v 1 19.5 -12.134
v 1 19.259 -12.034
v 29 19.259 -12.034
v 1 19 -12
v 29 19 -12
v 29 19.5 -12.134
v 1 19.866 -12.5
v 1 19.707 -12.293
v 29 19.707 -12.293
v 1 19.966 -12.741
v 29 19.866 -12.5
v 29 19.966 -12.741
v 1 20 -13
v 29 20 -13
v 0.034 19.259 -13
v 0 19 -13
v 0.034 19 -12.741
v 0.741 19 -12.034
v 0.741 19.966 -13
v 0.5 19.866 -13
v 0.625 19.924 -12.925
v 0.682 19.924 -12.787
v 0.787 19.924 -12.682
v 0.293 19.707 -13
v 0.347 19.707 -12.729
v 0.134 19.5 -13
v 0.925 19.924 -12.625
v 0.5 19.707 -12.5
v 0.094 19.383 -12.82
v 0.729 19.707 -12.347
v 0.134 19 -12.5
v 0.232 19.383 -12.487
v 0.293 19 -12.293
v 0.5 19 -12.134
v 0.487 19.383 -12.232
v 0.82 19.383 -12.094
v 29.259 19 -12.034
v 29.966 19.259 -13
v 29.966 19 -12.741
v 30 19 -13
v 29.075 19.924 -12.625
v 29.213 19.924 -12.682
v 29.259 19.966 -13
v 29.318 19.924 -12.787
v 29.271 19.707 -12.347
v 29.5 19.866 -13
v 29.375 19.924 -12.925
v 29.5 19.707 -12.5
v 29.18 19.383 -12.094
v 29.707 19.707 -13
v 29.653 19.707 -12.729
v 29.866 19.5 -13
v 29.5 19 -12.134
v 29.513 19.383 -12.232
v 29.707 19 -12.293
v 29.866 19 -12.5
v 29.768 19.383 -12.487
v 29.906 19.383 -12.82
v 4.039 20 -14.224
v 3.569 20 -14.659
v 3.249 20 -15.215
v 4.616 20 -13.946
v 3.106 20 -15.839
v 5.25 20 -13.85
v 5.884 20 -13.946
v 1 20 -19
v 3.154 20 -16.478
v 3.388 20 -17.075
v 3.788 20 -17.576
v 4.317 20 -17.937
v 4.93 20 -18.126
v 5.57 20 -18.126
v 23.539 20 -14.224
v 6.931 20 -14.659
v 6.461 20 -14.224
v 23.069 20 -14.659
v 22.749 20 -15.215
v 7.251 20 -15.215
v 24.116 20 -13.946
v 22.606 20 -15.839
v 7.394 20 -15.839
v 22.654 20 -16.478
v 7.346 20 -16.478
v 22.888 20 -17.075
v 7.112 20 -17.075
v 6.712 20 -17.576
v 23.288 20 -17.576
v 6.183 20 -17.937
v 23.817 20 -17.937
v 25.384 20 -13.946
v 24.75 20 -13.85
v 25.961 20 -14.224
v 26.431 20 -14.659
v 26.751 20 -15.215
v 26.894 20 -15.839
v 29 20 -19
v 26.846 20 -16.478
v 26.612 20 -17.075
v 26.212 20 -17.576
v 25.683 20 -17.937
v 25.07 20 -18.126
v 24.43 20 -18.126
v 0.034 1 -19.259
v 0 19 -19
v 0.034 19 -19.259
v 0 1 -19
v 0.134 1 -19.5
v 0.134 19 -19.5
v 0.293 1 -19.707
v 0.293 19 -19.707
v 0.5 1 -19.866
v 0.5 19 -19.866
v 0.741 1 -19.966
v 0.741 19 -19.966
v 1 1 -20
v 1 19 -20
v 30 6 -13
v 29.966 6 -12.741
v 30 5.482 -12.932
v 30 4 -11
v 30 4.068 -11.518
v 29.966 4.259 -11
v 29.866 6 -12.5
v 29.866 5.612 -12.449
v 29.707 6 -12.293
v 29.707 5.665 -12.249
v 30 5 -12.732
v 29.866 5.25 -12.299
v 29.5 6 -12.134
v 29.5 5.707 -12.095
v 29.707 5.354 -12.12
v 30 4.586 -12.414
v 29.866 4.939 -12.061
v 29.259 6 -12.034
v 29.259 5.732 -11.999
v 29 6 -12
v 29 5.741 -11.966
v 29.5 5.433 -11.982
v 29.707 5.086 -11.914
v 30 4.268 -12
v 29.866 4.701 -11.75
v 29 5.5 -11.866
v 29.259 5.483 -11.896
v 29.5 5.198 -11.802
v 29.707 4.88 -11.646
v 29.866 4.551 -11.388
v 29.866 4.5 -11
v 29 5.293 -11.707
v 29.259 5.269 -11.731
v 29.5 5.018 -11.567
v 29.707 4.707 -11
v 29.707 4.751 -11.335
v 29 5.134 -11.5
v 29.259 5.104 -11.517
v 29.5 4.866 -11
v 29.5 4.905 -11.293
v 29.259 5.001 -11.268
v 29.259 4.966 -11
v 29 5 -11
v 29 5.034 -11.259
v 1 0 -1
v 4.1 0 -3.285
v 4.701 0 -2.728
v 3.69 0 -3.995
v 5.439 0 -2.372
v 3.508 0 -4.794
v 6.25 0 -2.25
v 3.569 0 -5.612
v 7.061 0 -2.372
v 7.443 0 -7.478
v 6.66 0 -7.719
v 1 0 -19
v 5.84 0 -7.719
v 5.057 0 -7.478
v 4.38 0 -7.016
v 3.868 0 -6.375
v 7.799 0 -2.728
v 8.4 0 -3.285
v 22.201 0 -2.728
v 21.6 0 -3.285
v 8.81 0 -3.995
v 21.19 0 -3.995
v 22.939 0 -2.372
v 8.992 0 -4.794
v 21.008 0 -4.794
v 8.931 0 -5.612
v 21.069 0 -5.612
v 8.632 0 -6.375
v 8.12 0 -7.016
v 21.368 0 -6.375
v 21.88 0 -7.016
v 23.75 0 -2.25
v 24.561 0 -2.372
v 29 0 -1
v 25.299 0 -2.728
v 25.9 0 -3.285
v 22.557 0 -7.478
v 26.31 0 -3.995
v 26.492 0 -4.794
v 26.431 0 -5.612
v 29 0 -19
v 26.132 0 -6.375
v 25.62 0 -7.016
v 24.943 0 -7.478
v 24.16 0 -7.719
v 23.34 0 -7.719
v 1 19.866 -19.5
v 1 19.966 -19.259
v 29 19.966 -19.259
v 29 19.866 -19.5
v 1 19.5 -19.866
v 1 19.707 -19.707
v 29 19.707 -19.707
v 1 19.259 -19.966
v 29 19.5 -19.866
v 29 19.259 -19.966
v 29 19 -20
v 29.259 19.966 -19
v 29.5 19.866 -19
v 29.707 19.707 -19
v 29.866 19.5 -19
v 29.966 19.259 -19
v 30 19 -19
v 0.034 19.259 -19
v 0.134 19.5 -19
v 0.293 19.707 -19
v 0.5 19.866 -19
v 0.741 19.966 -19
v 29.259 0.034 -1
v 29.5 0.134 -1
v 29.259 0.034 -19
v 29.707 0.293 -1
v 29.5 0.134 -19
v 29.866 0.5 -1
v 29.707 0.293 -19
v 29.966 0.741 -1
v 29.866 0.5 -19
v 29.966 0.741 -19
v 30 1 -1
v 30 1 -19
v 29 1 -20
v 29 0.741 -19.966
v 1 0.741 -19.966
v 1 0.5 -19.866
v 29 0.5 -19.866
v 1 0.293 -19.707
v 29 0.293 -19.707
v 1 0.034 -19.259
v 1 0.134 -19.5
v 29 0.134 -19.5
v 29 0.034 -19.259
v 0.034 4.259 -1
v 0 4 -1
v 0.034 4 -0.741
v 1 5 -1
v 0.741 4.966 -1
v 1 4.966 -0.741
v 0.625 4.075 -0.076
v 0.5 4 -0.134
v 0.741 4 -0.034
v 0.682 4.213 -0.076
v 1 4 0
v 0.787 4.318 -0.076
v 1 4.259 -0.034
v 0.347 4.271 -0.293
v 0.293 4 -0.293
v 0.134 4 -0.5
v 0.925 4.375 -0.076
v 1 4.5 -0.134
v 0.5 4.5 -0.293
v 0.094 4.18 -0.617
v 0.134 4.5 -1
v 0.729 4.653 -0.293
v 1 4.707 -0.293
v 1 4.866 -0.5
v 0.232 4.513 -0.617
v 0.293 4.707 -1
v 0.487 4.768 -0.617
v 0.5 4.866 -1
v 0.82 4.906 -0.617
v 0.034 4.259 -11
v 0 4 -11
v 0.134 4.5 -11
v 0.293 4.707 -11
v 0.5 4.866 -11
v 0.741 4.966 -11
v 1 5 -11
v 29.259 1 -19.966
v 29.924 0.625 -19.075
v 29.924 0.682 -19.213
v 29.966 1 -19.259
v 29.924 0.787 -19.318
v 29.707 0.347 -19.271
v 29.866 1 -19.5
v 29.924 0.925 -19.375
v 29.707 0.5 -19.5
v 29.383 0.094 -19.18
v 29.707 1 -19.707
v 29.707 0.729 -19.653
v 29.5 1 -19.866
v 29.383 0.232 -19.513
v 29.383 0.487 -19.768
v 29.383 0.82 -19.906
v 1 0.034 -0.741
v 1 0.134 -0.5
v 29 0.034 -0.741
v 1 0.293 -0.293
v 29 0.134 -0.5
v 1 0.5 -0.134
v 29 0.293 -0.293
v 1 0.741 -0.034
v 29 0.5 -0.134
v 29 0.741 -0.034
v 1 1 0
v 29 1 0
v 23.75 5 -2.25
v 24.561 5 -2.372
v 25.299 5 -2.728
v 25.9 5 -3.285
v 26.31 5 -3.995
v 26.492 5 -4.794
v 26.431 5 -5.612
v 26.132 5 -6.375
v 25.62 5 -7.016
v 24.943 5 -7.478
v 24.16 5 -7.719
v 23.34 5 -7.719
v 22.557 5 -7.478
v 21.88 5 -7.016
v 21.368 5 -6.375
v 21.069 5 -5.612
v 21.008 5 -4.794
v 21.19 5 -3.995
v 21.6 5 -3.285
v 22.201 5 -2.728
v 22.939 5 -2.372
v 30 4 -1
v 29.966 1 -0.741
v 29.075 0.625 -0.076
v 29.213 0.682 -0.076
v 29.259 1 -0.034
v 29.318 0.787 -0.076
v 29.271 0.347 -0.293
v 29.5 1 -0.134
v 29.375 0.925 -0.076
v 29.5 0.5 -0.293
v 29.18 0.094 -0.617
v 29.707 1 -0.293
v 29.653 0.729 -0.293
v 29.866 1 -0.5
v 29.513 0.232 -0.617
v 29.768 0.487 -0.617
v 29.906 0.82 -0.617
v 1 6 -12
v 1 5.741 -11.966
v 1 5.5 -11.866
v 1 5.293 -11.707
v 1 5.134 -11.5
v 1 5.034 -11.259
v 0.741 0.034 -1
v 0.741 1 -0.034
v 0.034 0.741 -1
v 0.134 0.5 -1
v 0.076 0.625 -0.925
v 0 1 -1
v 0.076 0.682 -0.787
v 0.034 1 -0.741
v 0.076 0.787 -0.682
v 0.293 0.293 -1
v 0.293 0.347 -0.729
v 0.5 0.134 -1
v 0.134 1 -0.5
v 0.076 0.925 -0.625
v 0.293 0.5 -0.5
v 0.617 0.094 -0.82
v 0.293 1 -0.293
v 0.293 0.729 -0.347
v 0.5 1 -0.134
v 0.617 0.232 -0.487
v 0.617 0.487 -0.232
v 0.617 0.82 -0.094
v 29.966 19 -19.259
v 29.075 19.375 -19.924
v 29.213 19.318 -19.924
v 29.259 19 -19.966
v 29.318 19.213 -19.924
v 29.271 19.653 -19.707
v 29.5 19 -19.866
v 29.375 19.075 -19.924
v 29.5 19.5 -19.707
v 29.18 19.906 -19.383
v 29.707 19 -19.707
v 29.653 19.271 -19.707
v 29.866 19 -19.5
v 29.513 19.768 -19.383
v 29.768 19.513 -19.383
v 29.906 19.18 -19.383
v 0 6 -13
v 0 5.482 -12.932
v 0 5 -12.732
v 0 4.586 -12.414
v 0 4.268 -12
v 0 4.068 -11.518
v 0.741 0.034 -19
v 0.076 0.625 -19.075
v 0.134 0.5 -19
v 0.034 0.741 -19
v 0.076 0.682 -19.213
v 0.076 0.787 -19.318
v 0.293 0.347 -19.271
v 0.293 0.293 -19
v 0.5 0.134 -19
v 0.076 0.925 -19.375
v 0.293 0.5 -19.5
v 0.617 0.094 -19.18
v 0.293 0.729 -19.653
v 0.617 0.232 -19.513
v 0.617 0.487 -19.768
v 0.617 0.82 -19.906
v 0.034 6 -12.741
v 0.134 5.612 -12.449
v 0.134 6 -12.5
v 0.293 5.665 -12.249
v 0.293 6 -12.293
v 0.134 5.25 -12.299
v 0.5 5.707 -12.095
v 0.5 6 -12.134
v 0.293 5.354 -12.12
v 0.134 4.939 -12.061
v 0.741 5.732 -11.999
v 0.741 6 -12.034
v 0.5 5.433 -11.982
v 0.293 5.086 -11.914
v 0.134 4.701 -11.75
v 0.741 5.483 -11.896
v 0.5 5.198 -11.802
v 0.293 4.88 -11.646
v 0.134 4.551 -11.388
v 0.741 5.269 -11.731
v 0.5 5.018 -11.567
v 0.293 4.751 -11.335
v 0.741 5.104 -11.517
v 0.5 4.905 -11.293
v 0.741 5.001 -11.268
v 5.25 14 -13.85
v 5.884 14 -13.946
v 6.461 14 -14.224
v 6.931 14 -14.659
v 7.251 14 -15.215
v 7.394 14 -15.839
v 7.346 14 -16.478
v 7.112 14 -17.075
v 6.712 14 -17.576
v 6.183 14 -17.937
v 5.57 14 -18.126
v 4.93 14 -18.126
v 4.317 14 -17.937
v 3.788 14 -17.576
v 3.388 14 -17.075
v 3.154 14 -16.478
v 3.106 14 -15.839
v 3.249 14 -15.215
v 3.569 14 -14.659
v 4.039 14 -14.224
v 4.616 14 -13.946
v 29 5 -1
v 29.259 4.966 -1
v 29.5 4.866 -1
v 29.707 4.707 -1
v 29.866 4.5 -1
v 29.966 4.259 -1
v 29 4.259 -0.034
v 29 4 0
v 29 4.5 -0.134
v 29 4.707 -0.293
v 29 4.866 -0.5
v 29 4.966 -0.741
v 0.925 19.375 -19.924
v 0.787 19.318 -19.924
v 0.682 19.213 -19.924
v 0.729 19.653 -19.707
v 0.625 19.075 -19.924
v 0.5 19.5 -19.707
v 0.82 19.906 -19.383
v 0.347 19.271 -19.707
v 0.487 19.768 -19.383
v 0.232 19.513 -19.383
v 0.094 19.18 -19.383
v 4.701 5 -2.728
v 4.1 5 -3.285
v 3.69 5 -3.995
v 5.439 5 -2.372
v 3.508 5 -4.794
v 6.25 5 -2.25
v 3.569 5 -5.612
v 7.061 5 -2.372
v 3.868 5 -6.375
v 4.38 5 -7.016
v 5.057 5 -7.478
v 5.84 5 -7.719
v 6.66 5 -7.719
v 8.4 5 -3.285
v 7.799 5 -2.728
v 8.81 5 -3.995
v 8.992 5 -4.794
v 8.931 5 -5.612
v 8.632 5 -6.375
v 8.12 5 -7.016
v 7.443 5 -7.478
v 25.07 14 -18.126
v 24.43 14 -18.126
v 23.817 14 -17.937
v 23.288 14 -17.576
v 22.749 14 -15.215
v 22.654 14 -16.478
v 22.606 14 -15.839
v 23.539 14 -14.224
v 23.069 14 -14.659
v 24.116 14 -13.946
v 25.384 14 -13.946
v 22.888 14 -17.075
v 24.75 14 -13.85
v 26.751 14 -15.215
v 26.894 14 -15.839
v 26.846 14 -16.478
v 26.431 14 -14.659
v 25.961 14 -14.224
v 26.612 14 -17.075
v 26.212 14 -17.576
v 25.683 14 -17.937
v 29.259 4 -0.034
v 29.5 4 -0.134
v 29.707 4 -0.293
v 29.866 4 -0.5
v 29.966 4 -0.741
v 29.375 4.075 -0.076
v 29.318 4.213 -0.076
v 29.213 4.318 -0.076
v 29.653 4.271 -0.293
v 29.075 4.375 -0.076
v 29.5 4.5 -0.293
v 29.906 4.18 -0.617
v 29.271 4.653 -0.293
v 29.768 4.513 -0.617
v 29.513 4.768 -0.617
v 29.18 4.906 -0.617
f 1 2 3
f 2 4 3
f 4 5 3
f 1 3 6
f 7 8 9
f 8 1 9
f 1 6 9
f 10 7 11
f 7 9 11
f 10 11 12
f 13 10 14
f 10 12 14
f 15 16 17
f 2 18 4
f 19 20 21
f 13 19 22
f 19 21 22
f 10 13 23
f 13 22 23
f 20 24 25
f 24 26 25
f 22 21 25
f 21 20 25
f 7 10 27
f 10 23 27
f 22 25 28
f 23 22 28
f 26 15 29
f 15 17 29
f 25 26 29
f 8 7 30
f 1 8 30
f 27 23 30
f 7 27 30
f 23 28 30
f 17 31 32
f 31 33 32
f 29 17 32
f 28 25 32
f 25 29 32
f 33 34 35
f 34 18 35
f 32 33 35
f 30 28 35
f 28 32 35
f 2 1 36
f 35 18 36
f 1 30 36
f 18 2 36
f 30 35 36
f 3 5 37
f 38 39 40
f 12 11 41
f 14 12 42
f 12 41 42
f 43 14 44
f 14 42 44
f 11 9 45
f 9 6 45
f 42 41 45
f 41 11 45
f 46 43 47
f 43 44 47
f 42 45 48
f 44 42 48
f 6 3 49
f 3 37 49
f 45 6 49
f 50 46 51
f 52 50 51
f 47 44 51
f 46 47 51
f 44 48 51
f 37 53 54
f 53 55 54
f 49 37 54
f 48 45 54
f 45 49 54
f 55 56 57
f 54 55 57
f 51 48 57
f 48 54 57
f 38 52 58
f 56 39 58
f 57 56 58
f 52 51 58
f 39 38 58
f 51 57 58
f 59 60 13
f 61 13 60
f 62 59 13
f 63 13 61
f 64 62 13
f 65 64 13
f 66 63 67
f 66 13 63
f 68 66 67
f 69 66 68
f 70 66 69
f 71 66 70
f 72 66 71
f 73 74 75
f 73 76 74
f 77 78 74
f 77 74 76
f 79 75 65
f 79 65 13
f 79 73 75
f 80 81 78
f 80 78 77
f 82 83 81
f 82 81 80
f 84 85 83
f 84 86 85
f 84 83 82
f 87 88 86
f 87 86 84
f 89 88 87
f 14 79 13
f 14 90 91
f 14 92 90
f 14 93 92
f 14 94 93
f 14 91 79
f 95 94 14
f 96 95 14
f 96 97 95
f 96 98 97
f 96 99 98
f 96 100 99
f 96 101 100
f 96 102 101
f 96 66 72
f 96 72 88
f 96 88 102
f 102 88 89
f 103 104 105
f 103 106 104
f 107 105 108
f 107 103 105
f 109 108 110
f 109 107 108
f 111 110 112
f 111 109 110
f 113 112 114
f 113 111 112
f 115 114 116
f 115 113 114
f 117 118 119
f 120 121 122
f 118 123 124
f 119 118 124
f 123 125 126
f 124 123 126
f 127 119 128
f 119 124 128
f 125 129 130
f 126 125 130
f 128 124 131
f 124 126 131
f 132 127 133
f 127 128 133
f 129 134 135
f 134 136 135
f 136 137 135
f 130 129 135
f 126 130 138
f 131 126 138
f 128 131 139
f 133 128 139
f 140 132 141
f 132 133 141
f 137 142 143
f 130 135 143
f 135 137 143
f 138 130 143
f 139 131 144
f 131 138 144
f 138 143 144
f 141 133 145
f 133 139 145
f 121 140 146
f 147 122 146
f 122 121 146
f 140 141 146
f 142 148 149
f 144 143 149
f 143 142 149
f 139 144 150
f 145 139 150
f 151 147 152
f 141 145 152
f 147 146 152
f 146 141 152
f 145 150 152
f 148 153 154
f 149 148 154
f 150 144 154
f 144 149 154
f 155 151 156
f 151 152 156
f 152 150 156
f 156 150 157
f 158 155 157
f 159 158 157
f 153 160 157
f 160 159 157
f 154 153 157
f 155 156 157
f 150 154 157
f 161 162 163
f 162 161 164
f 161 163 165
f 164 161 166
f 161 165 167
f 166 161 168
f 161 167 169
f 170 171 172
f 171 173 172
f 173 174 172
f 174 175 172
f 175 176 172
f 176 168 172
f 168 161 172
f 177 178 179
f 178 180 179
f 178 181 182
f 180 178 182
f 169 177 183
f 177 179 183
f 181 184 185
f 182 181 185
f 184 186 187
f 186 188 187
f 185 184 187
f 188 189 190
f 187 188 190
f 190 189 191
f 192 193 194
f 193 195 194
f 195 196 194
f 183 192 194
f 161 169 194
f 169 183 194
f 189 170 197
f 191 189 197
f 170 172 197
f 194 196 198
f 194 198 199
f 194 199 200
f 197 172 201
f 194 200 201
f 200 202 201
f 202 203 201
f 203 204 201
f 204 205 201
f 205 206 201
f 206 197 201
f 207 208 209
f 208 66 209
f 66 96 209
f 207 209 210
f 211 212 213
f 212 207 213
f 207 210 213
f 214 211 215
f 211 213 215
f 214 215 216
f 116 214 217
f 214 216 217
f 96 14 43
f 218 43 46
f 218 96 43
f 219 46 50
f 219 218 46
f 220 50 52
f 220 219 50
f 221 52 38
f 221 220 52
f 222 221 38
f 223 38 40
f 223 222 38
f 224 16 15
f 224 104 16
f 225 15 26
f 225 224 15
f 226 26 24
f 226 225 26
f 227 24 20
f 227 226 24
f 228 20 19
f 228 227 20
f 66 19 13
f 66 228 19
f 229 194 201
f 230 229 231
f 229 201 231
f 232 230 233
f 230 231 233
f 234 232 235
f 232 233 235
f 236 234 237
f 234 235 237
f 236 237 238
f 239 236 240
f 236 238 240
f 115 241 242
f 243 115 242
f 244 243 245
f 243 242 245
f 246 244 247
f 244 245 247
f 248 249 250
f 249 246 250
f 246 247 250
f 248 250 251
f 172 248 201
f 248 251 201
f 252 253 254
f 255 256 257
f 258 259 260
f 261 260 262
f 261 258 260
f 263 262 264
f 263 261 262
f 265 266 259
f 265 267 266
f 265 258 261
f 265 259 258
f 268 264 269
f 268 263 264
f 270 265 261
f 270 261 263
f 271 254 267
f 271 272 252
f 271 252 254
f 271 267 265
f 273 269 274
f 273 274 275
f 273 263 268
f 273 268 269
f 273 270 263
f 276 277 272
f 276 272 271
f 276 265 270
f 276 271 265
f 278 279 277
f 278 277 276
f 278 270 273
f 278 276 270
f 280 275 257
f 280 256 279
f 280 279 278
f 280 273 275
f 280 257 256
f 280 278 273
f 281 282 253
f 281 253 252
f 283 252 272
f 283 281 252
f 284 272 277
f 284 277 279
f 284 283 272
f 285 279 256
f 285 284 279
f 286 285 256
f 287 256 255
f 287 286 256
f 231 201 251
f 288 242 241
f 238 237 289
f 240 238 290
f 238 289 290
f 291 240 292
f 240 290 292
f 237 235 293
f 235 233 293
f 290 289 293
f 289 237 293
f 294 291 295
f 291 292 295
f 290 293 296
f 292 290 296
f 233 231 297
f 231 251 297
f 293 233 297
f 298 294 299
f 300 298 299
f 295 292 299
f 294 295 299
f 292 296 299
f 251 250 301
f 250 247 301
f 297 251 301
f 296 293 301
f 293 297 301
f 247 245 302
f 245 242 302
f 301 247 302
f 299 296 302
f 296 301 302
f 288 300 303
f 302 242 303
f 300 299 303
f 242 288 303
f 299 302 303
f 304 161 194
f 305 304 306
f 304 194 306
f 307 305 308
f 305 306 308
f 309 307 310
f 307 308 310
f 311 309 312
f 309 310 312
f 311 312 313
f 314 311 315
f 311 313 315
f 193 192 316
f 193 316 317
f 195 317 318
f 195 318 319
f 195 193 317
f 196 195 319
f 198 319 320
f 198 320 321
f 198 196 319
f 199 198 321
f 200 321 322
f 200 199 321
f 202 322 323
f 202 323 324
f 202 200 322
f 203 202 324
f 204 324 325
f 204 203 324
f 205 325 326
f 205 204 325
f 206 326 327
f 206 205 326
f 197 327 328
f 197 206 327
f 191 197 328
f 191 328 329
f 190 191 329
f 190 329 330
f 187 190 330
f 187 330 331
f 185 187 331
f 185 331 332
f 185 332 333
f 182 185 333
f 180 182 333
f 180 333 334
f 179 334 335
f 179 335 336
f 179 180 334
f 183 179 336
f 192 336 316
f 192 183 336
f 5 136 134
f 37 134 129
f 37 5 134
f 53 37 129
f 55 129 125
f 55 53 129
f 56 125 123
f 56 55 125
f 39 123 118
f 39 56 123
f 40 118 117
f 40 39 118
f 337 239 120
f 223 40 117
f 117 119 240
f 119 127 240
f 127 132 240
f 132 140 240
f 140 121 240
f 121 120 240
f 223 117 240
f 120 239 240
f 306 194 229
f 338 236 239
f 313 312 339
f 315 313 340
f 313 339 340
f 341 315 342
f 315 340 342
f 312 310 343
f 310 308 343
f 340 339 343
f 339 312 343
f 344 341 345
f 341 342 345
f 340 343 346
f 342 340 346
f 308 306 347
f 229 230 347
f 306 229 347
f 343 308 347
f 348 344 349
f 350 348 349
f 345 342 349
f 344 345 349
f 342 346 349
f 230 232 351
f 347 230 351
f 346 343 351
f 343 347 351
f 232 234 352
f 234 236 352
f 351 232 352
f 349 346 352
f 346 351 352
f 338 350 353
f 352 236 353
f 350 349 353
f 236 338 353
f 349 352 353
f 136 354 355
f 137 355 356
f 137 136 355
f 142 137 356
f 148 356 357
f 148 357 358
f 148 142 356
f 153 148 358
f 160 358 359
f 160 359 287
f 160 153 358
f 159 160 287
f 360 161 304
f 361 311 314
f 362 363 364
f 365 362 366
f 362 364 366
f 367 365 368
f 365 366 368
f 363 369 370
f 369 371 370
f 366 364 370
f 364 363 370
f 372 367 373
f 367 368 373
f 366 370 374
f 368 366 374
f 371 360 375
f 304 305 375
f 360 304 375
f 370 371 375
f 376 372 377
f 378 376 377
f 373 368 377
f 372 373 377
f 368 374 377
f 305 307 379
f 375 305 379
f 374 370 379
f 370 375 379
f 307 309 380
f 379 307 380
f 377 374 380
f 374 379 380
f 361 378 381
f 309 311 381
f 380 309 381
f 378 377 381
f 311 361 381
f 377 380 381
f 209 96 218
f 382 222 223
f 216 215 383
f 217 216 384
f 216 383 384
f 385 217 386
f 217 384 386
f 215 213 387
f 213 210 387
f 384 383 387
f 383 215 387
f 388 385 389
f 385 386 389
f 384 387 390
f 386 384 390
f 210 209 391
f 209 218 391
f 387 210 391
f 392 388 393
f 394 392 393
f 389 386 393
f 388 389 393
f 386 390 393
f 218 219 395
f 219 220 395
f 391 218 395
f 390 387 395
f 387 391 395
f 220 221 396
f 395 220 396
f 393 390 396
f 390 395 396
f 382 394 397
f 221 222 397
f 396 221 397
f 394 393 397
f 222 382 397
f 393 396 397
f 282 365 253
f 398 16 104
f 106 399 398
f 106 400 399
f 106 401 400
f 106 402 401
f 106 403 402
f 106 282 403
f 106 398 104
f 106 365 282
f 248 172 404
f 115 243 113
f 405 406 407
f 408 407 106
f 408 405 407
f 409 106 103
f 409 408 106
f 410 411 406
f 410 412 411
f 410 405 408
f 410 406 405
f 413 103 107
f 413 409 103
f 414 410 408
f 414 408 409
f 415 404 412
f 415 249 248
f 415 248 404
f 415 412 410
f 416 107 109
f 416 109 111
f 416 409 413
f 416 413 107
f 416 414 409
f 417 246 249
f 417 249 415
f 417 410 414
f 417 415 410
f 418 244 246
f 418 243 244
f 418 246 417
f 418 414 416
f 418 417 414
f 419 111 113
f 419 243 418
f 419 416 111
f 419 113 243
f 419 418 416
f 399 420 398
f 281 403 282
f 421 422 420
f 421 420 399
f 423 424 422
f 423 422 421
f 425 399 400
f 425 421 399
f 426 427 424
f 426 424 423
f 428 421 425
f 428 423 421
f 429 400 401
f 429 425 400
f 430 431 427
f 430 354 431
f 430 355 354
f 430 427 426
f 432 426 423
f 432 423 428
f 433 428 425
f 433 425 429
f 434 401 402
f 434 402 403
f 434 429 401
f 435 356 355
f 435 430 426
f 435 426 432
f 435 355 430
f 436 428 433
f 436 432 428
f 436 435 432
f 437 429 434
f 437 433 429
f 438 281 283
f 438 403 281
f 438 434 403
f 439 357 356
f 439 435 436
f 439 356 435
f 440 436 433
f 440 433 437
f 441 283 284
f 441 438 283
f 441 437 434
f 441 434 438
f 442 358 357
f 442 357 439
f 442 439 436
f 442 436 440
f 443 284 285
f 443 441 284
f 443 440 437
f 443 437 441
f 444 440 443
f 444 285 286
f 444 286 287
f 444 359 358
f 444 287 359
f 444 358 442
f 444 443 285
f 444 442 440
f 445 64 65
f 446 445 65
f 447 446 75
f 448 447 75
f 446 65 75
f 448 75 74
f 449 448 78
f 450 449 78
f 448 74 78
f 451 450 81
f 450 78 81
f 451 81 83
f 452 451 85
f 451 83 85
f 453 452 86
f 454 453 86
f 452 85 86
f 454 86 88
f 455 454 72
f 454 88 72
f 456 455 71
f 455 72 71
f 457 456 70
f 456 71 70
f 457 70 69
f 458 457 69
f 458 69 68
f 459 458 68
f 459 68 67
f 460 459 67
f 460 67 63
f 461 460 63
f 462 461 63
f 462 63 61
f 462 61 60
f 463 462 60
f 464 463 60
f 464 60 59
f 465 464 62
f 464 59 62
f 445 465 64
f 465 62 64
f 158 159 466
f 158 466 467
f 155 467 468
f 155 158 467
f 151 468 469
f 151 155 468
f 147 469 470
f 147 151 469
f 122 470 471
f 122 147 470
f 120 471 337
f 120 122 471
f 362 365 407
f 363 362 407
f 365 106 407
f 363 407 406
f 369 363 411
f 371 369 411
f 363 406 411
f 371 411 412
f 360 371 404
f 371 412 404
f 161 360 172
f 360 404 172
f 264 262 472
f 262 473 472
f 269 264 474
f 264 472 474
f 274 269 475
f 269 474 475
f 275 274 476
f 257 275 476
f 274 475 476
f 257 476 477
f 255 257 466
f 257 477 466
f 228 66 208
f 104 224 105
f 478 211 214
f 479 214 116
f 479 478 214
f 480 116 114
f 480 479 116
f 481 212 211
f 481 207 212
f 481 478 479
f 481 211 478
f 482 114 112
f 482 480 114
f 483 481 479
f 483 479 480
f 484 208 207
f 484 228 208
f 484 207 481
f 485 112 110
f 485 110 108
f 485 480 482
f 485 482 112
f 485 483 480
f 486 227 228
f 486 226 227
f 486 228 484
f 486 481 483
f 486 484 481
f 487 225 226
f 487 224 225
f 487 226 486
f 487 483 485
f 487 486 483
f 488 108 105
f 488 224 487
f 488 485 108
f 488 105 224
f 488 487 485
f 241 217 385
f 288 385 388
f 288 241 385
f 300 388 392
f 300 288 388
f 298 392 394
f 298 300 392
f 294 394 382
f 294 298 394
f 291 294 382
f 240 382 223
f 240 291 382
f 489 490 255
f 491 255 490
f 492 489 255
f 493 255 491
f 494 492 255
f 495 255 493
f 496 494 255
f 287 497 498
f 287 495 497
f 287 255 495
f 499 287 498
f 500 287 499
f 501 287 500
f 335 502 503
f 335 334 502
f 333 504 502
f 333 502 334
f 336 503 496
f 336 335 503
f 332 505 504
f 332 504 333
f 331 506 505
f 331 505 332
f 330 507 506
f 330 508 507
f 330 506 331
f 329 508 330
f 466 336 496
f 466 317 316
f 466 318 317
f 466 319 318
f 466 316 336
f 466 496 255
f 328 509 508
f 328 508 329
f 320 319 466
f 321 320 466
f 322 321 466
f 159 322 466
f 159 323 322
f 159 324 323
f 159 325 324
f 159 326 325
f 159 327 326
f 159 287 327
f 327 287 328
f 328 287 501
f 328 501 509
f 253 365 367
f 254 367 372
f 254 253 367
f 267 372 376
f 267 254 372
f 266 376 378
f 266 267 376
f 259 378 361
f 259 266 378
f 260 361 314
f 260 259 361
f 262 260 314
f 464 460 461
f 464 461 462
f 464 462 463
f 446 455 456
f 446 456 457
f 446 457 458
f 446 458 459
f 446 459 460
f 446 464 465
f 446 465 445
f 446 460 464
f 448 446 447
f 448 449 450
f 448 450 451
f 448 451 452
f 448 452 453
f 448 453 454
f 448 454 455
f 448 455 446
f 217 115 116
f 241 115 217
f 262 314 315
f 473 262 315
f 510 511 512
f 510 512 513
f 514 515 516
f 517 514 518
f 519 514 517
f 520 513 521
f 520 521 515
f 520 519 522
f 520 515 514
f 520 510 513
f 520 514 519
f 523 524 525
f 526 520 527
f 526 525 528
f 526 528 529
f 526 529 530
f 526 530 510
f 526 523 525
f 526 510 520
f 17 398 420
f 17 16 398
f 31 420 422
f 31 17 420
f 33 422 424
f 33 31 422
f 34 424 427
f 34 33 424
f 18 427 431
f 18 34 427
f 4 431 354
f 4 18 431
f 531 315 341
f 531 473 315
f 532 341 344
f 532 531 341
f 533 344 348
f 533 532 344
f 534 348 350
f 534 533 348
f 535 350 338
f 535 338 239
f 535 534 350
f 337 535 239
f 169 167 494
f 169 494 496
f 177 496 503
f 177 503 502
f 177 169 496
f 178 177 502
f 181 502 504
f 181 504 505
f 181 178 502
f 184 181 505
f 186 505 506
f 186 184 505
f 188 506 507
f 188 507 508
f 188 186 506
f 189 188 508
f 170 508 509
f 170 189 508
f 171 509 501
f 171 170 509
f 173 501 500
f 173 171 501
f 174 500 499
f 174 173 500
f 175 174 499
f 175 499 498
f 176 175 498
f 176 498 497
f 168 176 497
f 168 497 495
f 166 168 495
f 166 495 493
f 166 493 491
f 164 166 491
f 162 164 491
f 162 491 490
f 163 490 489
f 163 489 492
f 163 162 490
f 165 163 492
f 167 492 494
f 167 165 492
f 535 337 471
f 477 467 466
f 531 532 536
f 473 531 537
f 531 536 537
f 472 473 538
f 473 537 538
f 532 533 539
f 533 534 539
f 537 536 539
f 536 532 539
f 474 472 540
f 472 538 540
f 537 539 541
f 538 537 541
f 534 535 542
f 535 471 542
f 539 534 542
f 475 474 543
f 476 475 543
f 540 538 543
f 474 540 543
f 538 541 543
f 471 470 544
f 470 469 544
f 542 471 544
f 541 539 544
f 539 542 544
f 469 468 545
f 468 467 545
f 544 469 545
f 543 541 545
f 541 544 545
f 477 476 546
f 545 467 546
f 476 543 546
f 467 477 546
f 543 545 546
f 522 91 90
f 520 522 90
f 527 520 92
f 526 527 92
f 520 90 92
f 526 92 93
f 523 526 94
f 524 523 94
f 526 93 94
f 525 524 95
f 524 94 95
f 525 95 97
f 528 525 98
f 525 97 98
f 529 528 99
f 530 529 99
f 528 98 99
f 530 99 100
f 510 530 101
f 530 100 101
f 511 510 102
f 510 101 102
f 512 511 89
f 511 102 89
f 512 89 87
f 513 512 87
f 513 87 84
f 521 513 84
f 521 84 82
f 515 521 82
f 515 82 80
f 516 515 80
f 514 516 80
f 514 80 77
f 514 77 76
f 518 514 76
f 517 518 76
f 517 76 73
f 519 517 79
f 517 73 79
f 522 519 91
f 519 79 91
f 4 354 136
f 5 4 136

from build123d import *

# Parameters (mm, degrees)
SKETCH1_W           = 30
SKETCH1_H           = 20
SKETCH1_R           = 2.75
BOSS_EXTRUDE1_DEPTH = 5
SKETCH2_W           = 30
SKETCH2_H           = 8
BOSS_EXTRUDE2_DEPTH = 15
SKETCH3_R           = 2.15
CUT_EXTRUDE1_DEPTH  = 6
FILLET1_R           = 1


with BuildPart() as part:
    # Sketch1 → Boss-Extrude1 (new body)
    with BuildSketch(Plane(origin=(0, 0, 0), x_dir=(1, 0, 0), z_dir=(0, 1, 0))):
        with Locations((15, 10)):
            Rectangle(SKETCH1_W, SKETCH1_H)
        with Locations(Location((6.25, 5, 0), (0, 0, 270))):
            Circle(SKETCH1_R, mode=Mode.SUBTRACT)
        with Locations(Location((23.75, 5, 0), (0, 0, 270))):
            Circle(SKETCH1_R, mode=Mode.SUBTRACT)
    extrude(amount=BOSS_EXTRUDE1_DEPTH)

    # Sketch2 → Boss-Extrude2 (add)
    with BuildSketch(Plane(origin=(0, 5, 0), x_dir=(1, 0, 0), z_dir=(0, 1, 0))):
        with Locations((15, 16)):
            Rectangle(SKETCH2_W, SKETCH2_H)
    extrude(amount=BOSS_EXTRUDE2_DEPTH)

    # Sketch3 → Cut-Extrude1 (cut)
    with BuildSketch(Plane(origin=(0, 20, 0), x_dir=(1, 0, 0), z_dir=(0, 1, 0))):
        with Locations(Location((5.25, 16, 0), (0, 0, 270))):
            Circle(SKETCH3_R)
        with Locations(Location((24.75, 16, 0), (0, 0, 270))):
            Circle(SKETCH3_R)
    extrude(amount=-CUT_EXTRUDE1_DEPTH, mode=Mode.SUBTRACT)

    # Fillet1
    fillet1_edges = [part.edges().sort_by_distance(p)[0] for p in [
        (30, 5, -6),
        (0, 5, -6),
        (15, 5, -12),
        (0, 12.5, -12),
        (30, 12.5, -12),
        (0, 20, -16),
        (15, 20, -12),
        (30, 20, -16),
        (15, 20, -20),
        (15, 0, -20),
        (30, 0, -10),
        (15, 0, 0),
        (0, 0, -10),
        (0, 10, -20),
        (30, 10, -20),
        (30, 2.5, 0),
        (0, 2.5, 0),
        (15, 5, 0),
    ]]
    fillet(fillet1_edges, radius=FILLET1_R)


solid = part.part
